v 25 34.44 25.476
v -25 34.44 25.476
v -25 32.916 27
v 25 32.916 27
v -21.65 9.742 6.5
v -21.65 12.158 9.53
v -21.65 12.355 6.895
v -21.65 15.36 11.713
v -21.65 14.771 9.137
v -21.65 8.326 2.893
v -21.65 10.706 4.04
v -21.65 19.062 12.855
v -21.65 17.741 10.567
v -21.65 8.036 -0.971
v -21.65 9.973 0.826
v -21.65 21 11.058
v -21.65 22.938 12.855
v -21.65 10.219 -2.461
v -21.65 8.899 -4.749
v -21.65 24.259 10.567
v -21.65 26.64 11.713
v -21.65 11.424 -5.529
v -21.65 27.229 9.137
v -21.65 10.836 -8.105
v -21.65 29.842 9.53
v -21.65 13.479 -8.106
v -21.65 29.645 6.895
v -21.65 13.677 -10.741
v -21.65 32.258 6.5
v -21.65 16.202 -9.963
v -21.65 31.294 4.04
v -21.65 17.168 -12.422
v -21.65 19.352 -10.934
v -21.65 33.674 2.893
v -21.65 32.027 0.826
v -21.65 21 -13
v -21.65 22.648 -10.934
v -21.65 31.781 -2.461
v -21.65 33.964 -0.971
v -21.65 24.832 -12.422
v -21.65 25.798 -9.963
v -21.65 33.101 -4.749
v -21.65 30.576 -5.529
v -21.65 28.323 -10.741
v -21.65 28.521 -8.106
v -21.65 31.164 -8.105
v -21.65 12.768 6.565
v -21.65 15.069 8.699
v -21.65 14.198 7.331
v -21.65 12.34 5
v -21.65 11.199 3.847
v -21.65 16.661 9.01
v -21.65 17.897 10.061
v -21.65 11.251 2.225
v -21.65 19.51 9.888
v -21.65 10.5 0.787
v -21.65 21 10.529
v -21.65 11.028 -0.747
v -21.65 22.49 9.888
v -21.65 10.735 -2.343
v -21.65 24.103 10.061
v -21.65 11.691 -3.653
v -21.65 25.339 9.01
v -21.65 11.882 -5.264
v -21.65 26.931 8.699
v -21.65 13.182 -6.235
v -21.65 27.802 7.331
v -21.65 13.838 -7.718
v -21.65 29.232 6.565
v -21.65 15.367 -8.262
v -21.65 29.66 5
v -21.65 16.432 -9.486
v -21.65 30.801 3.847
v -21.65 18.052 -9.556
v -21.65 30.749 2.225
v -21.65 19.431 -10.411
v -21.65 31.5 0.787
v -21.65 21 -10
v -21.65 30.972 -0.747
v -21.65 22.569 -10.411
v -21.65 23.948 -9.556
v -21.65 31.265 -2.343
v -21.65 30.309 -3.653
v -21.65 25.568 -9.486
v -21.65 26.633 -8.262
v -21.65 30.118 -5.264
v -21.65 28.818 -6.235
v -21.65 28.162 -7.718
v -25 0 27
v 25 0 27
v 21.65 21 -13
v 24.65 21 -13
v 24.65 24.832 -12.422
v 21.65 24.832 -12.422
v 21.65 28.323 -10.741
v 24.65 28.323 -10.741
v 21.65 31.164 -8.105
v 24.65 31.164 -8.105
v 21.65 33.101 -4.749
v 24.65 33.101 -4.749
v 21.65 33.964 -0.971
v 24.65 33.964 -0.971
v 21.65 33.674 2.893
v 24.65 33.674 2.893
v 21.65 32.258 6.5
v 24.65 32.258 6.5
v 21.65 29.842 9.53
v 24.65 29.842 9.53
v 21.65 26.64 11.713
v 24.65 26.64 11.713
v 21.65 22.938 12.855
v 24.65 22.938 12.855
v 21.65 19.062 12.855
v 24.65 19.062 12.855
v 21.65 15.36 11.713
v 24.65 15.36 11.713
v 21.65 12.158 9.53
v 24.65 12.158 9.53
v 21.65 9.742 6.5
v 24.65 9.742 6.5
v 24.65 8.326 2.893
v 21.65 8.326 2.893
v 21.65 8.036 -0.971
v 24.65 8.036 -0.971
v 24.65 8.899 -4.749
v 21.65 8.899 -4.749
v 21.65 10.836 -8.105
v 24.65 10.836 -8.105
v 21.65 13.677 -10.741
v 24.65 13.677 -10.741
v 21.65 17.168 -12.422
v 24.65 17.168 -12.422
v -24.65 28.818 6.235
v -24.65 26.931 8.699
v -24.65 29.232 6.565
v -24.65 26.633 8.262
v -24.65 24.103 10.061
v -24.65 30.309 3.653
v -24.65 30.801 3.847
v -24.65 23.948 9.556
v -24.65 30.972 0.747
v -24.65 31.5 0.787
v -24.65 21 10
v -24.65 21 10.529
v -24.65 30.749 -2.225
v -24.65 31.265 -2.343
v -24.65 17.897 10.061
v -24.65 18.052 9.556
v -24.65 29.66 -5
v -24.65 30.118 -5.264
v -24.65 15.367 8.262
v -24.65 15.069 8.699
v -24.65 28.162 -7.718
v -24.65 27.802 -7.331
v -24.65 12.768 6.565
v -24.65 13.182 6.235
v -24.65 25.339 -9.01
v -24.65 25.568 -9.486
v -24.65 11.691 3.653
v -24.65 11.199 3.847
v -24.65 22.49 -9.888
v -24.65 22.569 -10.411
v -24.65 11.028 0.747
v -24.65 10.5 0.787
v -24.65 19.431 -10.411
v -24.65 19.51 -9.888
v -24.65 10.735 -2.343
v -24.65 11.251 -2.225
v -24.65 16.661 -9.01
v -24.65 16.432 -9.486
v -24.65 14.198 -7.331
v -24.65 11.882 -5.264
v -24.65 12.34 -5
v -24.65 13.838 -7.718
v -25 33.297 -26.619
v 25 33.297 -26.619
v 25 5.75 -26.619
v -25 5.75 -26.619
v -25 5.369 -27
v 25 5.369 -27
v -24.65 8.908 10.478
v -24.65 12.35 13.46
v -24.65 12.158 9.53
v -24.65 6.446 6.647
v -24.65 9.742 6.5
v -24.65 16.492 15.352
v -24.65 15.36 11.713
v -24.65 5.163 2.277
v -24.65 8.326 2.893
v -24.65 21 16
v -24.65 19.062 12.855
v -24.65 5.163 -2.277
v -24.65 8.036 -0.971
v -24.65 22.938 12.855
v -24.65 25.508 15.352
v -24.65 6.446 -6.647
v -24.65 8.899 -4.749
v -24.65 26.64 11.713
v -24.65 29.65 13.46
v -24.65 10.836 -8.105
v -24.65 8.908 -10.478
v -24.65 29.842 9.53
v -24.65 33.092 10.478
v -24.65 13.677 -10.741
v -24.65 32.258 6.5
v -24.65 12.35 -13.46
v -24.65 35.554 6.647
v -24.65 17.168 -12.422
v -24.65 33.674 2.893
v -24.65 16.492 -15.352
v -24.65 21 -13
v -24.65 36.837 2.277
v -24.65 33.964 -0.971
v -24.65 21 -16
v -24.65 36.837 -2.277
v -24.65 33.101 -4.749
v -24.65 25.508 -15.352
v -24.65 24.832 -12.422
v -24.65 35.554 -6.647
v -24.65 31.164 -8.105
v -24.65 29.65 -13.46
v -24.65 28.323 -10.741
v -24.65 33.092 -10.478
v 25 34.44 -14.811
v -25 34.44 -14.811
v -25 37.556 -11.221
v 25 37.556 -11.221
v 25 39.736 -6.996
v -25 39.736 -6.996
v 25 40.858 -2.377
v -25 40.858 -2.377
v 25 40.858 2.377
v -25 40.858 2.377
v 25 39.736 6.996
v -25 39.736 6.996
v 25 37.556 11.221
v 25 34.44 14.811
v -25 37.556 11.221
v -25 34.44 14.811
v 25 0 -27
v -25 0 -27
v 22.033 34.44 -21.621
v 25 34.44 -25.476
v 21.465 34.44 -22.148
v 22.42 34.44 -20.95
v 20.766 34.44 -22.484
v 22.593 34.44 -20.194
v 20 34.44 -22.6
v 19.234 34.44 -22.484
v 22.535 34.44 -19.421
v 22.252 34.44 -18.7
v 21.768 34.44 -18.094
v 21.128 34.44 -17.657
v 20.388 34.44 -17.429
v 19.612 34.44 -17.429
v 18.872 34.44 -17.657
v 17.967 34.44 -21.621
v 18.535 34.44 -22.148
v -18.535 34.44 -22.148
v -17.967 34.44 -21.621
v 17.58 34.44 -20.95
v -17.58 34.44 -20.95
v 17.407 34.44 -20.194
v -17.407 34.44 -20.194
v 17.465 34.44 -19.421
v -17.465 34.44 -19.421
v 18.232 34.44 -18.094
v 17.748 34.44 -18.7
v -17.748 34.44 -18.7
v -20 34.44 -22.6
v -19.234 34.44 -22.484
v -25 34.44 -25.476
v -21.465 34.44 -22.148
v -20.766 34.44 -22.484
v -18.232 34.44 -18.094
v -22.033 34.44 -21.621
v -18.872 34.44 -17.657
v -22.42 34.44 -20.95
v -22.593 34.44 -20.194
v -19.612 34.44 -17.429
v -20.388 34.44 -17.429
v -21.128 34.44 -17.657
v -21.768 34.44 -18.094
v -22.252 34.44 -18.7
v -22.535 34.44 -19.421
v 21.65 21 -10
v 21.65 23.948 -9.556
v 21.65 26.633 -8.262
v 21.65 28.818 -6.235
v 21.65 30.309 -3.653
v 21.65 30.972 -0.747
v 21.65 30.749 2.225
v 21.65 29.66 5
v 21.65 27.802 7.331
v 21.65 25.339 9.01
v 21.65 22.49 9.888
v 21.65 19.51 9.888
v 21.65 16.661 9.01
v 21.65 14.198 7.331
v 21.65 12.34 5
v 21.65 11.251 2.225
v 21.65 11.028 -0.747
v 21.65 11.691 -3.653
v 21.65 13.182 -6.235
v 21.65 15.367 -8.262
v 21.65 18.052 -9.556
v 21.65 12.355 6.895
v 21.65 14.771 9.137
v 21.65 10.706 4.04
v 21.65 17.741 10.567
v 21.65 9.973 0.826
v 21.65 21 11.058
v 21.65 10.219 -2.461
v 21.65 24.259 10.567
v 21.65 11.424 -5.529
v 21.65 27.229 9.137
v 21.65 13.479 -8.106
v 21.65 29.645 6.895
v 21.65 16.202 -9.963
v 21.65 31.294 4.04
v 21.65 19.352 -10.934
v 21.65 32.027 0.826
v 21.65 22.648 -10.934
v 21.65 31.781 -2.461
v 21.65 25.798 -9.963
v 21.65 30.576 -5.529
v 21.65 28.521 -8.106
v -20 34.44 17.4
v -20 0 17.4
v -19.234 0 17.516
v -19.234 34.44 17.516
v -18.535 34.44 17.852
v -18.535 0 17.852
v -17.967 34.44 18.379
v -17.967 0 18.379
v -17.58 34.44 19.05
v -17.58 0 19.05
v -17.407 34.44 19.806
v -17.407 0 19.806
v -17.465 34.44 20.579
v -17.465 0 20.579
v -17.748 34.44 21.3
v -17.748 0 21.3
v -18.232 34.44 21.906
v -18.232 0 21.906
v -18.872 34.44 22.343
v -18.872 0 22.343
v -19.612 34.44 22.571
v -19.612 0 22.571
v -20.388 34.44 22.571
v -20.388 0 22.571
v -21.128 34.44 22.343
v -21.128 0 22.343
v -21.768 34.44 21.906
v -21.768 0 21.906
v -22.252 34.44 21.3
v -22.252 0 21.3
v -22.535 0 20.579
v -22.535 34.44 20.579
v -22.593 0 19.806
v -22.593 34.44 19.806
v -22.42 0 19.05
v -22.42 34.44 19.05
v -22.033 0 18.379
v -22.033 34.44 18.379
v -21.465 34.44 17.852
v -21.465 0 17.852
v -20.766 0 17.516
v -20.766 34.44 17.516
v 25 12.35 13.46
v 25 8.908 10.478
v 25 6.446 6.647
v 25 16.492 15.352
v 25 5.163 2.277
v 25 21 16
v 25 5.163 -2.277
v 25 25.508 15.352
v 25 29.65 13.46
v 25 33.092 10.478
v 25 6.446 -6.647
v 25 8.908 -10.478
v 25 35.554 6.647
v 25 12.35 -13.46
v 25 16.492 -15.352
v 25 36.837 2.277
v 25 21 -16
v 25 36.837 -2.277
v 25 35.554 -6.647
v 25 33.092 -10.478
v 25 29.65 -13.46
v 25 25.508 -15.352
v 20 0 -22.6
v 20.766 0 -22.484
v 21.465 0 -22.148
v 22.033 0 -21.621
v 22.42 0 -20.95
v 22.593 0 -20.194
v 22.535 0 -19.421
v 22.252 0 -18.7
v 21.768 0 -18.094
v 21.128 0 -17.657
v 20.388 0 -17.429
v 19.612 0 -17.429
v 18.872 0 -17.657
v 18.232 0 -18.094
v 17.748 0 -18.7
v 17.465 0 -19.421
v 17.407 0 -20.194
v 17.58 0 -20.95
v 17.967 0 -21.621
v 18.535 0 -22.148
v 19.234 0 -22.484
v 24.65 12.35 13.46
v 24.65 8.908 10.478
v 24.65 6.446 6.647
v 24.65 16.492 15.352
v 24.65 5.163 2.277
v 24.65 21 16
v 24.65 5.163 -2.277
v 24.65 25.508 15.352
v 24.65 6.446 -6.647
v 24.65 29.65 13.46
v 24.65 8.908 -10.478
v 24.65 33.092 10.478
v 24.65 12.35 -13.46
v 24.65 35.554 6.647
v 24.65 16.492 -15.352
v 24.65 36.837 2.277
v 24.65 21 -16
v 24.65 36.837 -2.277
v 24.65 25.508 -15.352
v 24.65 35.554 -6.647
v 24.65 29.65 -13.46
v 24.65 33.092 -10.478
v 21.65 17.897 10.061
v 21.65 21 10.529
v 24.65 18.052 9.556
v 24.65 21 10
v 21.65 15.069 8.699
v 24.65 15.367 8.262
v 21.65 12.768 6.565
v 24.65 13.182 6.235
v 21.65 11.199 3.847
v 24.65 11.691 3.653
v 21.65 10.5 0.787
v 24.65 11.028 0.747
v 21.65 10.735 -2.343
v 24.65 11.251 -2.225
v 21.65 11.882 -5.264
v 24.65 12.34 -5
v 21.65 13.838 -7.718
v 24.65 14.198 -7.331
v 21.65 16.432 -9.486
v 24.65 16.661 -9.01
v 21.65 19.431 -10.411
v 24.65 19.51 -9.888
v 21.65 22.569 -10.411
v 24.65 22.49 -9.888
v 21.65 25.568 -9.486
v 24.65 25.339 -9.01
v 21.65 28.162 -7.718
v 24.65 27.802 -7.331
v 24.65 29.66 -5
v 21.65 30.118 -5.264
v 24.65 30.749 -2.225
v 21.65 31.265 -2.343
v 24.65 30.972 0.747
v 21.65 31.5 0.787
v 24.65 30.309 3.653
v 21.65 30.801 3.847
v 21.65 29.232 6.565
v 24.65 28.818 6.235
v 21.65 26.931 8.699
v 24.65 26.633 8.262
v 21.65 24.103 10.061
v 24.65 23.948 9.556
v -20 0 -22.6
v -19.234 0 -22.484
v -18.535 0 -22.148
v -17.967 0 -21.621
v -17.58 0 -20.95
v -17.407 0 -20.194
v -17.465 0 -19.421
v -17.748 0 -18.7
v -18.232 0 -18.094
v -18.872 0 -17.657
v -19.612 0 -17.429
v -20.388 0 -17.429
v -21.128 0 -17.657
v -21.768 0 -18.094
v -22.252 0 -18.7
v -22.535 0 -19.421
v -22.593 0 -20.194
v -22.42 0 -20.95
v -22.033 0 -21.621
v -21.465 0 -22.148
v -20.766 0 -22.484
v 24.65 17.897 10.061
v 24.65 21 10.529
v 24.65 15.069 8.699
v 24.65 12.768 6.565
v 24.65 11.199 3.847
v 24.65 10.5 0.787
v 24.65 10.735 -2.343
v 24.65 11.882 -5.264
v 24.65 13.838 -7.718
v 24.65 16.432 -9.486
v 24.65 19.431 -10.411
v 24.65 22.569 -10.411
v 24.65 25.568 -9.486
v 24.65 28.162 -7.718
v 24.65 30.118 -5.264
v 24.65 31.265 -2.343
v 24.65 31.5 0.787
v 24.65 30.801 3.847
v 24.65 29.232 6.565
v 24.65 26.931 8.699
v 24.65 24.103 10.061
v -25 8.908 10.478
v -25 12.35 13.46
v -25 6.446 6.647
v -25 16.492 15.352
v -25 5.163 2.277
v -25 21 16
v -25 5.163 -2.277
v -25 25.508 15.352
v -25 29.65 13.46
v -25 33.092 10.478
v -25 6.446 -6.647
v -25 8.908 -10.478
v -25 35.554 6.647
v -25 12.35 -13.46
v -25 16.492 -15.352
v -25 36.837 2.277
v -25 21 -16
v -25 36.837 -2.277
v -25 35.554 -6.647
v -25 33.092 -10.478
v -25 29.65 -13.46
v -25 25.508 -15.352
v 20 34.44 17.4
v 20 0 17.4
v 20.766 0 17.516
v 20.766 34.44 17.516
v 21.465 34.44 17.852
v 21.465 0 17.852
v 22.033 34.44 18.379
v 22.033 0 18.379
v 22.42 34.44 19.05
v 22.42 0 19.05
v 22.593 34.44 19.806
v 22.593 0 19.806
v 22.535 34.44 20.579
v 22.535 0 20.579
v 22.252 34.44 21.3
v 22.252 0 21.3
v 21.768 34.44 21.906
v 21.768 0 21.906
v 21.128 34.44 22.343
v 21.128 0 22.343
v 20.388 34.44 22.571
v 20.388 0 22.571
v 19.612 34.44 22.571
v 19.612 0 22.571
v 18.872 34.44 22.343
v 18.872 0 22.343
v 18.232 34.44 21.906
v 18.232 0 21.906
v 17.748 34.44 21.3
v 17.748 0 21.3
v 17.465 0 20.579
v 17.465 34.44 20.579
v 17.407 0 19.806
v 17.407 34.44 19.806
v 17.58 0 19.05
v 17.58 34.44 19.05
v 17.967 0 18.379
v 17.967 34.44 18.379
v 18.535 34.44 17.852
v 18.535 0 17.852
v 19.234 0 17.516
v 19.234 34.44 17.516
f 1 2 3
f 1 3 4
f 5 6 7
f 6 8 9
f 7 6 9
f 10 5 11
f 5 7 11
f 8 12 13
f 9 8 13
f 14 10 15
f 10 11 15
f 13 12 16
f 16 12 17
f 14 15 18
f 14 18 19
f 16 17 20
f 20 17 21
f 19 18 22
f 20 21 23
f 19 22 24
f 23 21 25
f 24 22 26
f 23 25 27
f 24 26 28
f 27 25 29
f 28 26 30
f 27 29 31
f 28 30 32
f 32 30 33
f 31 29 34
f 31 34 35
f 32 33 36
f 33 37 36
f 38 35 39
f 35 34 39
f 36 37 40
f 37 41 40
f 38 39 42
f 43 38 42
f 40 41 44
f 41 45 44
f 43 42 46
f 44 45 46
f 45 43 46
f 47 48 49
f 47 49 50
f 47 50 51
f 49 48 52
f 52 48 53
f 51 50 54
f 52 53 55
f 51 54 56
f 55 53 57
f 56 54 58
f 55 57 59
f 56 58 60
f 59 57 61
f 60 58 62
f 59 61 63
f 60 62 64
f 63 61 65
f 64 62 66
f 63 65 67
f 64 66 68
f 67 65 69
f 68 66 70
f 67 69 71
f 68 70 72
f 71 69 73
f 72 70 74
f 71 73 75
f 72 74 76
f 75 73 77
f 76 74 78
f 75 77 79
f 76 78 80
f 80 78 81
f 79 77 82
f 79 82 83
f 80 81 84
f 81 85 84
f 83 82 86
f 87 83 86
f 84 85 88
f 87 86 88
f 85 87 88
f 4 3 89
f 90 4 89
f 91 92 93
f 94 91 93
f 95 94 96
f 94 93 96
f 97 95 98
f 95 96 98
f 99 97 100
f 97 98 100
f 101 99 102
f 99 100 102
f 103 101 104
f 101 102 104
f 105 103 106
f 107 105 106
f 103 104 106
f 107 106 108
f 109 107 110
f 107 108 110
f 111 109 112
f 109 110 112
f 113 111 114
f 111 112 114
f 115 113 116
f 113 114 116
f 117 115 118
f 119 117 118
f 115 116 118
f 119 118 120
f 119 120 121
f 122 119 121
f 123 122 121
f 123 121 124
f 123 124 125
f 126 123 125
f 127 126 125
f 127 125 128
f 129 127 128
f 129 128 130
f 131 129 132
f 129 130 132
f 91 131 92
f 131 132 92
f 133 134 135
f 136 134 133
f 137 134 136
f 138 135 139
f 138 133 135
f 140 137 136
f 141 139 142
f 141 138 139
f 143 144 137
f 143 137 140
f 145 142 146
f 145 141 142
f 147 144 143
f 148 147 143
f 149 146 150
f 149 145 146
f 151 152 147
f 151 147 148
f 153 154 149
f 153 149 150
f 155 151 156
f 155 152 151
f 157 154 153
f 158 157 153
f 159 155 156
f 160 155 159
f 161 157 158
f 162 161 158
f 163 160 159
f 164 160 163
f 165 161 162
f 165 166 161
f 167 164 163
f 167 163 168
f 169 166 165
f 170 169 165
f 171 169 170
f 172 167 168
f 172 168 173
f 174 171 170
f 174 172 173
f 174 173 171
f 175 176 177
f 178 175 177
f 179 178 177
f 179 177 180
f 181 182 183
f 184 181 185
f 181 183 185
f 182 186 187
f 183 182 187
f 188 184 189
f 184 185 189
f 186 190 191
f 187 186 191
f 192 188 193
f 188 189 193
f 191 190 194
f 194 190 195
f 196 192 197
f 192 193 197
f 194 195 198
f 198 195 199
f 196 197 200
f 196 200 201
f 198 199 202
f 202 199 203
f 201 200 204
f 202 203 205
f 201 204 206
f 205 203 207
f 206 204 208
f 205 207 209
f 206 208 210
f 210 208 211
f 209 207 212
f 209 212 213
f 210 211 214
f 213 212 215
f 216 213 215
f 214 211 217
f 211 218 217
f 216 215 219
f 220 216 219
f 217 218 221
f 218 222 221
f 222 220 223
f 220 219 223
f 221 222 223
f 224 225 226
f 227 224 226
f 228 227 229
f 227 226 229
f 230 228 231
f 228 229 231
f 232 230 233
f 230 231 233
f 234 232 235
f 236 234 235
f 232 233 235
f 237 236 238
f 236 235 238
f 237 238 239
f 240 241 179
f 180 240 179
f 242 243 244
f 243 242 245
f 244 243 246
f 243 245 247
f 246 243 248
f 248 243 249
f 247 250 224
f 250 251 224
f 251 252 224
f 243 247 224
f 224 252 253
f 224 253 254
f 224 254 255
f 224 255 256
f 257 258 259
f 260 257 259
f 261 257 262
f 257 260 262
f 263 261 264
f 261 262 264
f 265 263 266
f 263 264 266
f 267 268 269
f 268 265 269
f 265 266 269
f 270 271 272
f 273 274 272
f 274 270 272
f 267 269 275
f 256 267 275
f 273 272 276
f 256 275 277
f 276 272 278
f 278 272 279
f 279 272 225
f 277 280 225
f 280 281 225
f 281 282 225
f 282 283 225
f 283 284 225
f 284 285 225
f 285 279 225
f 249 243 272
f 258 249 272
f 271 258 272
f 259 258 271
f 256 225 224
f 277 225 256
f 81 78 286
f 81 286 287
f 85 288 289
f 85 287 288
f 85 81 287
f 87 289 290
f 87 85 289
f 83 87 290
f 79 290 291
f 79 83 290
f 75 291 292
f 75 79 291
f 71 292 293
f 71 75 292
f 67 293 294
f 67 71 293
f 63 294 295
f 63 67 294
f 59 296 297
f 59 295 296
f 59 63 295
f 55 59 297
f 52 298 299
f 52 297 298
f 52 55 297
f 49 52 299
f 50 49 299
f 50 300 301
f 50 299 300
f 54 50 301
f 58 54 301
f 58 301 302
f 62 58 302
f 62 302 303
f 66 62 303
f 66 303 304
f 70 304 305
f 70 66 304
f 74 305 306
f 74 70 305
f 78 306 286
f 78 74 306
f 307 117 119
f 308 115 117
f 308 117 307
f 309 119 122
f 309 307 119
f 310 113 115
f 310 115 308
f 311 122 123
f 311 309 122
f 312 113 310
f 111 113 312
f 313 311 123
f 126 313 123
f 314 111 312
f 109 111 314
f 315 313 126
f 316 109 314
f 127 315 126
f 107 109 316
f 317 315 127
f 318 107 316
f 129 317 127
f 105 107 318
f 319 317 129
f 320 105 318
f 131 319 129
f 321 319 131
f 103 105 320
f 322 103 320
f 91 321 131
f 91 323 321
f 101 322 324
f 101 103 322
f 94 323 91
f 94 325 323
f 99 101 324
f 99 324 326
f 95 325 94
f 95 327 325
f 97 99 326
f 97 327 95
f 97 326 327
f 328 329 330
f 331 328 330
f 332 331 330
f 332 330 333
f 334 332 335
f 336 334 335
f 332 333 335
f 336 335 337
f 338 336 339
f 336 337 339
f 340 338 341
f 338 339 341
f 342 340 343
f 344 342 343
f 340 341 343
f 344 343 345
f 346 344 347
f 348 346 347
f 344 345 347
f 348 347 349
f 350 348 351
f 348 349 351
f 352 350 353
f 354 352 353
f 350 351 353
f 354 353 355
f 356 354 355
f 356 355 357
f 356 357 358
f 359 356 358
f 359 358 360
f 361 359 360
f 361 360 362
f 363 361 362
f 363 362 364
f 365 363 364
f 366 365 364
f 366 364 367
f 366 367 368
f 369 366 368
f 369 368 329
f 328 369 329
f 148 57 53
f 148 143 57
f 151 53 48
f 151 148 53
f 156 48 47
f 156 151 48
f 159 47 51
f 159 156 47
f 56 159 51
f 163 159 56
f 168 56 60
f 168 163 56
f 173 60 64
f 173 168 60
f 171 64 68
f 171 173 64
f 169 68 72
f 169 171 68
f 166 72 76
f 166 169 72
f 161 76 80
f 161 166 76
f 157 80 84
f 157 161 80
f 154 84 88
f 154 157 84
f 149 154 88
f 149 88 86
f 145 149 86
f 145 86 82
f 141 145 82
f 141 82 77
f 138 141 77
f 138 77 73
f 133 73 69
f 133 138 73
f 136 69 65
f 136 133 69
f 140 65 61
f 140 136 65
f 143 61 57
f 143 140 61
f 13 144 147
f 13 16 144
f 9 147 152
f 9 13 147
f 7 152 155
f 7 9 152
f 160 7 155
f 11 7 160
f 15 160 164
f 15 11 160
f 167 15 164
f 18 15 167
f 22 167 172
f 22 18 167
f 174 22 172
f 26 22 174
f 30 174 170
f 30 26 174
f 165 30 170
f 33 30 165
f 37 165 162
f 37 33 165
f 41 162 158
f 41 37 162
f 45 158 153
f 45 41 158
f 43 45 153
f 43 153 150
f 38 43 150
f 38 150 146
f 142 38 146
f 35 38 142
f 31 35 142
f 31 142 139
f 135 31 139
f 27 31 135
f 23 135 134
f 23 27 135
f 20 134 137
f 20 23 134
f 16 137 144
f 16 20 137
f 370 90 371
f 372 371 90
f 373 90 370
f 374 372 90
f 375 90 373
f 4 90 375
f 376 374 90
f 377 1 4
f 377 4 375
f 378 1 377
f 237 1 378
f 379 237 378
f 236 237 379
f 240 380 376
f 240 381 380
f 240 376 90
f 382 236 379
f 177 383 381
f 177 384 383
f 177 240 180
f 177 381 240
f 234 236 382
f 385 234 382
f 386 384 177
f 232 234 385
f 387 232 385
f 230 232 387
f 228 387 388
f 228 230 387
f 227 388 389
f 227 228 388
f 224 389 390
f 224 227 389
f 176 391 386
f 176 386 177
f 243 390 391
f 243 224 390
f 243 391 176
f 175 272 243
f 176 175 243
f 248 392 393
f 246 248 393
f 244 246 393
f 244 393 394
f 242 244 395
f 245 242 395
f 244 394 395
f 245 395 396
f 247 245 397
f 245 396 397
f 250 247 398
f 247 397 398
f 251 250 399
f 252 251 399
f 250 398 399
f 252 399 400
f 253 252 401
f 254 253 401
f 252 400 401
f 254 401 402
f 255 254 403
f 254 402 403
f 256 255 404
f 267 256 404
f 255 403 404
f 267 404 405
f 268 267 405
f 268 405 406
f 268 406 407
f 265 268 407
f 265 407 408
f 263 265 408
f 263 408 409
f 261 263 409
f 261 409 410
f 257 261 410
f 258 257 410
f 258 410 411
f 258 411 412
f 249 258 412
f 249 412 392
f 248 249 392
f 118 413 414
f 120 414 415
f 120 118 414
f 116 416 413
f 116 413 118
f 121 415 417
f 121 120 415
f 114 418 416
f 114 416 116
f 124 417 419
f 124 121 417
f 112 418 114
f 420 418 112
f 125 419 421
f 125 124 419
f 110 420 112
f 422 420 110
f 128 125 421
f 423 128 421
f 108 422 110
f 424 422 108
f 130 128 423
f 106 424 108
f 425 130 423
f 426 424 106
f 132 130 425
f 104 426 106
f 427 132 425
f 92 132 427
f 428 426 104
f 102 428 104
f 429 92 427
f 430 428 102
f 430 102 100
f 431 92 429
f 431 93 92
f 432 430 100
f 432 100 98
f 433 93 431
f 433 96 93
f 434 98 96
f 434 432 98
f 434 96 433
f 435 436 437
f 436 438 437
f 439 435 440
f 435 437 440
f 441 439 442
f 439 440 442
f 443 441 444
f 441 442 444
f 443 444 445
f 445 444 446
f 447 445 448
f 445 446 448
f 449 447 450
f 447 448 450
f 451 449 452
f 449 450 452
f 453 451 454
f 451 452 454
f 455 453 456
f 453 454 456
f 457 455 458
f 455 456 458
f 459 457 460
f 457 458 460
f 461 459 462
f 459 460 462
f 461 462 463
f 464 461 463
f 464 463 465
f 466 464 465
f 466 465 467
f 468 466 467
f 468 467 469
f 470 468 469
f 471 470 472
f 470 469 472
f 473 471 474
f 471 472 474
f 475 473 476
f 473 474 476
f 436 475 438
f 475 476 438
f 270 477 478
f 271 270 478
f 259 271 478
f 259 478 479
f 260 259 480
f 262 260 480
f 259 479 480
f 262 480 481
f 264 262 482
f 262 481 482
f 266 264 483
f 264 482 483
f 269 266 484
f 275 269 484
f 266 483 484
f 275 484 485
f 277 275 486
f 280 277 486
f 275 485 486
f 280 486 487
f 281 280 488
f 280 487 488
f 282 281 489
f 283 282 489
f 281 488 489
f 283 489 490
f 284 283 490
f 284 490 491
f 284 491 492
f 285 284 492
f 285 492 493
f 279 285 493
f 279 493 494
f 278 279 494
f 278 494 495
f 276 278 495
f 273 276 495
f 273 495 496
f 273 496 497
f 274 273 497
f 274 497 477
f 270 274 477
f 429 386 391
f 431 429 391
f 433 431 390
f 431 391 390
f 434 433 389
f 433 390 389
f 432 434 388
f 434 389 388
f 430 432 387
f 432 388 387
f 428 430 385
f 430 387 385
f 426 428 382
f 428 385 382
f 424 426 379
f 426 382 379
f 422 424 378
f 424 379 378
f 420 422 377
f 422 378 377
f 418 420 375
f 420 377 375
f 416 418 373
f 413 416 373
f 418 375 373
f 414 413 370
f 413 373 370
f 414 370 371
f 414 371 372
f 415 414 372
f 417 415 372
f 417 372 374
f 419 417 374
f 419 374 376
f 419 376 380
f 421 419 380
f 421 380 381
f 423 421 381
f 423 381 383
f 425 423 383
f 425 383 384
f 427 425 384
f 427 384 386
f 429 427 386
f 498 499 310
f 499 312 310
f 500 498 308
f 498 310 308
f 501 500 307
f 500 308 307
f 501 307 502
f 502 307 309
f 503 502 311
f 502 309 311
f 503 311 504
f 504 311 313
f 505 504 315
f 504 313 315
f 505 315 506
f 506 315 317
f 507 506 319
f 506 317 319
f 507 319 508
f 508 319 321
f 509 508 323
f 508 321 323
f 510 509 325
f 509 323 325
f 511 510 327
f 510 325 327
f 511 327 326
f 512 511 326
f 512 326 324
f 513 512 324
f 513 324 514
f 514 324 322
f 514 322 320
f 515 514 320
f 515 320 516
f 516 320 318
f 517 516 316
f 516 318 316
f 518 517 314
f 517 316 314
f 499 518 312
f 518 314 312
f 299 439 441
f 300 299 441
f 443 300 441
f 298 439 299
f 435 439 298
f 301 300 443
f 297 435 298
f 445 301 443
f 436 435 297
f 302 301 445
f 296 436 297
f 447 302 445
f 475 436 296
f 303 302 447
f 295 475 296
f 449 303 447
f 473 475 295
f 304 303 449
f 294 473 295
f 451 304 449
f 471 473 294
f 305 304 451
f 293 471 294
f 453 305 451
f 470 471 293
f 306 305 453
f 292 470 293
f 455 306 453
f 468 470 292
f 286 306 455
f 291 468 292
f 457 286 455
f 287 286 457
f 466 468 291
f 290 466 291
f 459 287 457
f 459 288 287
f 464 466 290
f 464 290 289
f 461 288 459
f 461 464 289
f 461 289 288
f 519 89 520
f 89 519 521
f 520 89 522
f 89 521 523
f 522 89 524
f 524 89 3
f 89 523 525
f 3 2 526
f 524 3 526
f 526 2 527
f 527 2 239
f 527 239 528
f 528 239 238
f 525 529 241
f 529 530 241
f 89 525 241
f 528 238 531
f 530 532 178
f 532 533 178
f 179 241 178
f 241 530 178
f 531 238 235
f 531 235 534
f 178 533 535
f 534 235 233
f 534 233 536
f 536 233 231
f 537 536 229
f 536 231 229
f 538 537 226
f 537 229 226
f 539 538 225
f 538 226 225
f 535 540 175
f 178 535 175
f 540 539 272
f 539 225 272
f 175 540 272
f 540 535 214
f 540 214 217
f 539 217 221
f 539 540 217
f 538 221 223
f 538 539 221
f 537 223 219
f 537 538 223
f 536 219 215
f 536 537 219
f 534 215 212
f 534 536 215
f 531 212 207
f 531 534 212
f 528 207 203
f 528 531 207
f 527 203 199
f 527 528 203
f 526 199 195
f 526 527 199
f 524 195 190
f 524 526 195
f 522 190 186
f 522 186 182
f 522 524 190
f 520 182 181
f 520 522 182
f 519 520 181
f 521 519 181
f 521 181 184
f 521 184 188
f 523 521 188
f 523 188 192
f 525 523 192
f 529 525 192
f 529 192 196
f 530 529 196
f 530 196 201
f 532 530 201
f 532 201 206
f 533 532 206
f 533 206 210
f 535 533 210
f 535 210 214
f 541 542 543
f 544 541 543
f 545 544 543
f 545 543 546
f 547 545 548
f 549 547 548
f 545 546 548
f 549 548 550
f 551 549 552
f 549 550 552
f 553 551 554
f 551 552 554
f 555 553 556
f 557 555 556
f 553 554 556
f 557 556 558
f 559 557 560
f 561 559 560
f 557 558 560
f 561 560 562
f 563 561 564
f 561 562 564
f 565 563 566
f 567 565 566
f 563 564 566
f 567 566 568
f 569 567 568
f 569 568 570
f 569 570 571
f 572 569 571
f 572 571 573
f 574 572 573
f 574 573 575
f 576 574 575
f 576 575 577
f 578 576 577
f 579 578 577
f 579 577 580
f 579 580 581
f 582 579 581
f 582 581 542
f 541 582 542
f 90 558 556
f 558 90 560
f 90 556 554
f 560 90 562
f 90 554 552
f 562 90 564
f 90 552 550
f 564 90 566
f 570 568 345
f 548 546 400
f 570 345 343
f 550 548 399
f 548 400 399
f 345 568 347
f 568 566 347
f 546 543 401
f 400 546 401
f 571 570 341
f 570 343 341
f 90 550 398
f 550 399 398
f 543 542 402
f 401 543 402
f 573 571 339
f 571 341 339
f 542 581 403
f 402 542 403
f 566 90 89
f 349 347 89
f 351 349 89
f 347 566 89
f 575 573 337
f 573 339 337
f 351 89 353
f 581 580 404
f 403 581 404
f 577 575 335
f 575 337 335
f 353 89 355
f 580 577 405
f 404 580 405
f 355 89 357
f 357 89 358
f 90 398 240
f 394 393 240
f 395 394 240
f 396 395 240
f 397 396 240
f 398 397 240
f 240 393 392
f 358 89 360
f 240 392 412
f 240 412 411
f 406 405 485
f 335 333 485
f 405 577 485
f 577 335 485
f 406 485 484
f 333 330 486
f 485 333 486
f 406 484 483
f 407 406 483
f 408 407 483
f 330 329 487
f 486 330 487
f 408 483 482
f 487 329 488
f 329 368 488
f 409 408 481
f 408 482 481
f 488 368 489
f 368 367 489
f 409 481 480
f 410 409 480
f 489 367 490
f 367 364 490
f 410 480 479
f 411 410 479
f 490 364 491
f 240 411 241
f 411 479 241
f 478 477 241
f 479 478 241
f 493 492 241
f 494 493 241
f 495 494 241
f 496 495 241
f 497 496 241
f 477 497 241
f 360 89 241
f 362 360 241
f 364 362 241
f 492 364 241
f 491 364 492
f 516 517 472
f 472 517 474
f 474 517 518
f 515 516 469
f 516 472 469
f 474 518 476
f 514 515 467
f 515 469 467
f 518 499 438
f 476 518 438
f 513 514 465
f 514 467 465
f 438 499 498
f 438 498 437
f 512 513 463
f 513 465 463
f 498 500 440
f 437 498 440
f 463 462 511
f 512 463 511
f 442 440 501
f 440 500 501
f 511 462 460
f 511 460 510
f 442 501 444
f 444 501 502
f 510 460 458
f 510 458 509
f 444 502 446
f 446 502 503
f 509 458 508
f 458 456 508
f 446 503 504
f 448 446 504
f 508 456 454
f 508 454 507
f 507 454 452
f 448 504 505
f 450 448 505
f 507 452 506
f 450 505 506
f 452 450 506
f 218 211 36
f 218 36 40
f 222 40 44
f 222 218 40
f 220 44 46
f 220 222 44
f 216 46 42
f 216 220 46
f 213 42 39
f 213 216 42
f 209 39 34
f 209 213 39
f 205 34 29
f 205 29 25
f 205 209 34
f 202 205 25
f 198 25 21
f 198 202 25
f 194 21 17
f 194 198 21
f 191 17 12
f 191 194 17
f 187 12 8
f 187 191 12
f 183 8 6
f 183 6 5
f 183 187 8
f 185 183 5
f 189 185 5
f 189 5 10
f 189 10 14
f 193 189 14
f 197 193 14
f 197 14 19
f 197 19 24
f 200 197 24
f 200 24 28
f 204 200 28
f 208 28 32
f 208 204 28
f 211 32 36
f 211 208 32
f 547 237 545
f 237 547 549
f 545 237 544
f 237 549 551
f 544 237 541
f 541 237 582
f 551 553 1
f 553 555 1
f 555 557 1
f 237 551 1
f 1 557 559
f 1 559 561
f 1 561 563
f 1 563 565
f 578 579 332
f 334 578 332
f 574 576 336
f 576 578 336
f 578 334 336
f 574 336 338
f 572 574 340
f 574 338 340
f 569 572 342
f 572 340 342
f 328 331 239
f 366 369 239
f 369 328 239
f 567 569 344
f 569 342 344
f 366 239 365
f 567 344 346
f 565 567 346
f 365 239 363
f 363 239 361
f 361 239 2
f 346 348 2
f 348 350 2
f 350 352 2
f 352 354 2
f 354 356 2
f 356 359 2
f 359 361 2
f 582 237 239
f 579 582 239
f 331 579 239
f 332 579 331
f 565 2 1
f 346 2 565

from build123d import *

# Parameters (mm, degrees)
BOSS_EXTRUDE1_DEPTH      = 25
BOSS_EXTRUDE1_DEPTH_BACK = 25
SKETCH3_R                = 10
SKETCH4_R                = 16
CUT_EXTRUDE1_DEPTH       = 3.35
BOSS_EXTRUDE2_START      = 3
SKETCH5_R                = 16
SKETCH5_R_2              = 13
BOSS_EXTRUDE2_DEPTH      = 3
CHAMFER1_SIZE            = 1.523622135
CUT_EXTRUDE2_DEPTH       = 71.071392165
SKETCH11_R               = 2.6
CUT_EXTRUDE6_DEPTH       = 17.22
SKETCH12_R               = 2.6
CUT_EXTRUDE7_DEPTH       = 56.090834083


with BuildPart() as part:
    # Sketch3 → Boss-Extrude1 (new, two sides: drawn at the far end of the back side and taken through both)
    with BuildSketch(Plane(origin=(0, 0, 0), x_dir=(0, 0, -1), z_dir=(1, 0, 0)).offset(-BOSS_EXTRUDE1_DEPTH_BACK)):
        with BuildLine():
            Line((27, 0), (27, 34.44))
            Line((27, 34.44), (14.811022922, 34.44))
            ThreePointArc((14.811022922, 34.44), (0, 41), (-14.811022922, 34.44))
            Line((-14.811022922, 34.44), (-27, 34.44))
            Line((-27, 34.44), (-27, 0))
            Line((-27, 0), (27, 0))
        make_face()
        with Locations((0, 21)):
            Circle(SKETCH3_R, mode=Mode.SUBTRACT)
    extrude(amount=BOSS_EXTRUDE1_DEPTH + BOSS_EXTRUDE1_DEPTH_BACK)

    # Sketch4 → Cut-Extrude1 (cut)
    with BuildSketch(Plane(origin=(25, 0, 0), x_dir=(0, 0, -1), z_dir=(1, 0, 0))):
        with Locations((0, 21)):
            Circle(SKETCH4_R)
    cut_extrude1 = extrude(amount=-CUT_EXTRUDE1_DEPTH, mode=Mode.SUBTRACT)

    # Sketch5 → Boss-Extrude2 (add)
    with BuildSketch(Plane(origin=(21.65, 0, 0), x_dir=(0, 0, -1), z_dir=(1, 0, 0)).offset(BOSS_EXTRUDE2_START)):
        with Locations((0, 21)):
            Circle(SKETCH5_R)
        with Locations((0, 21)):
            Circle(SKETCH5_R_2, mode=Mode.SUBTRACT)
    boss_extrude2 = extrude(amount=-BOSS_EXTRUDE2_DEPTH)

    # Sketch6 → Revolve1 (revolve)
    with BuildSketch(Plane.XY, mode=Mode.PRIVATE) as revolve1_sk:
        Polygon((24.65, 31), (24.65, 31.528980942), (21.65, 32.057961884), (21.65, 31.528980942), align=None)
    revolve1 = revolve(revolve1_sk.sketch.rotate(Axis((-24.65, 21, 0), (1, 0, 0)), 90), axis=Axis((-24.65, 21, 0), (1, 0, 0)))

    # Mirror1: Cut-Extrude1, Boss-Extrude2, Revolve1 across plane
    add(cut_extrude1.mirror(Plane(origin=(0, 0, 0), x_dir=(0, 0, 1), z_dir=(1, 0, 0))), mode=Mode.SUBTRACT)
    add(boss_extrude2.mirror(Plane(origin=(0, 0, 0), x_dir=(0, 0, 1), z_dir=(1, 0, 0))))
    add(revolve1.mirror(Plane(origin=(0, 0, 0), x_dir=(0, 0, 1), z_dir=(1, 0, 0))))

    # Chamfer1
    chamfer1_edges = [part.edges().sort_by_distance(p)[0] for p in [
        (0, 34.44, 27),
        (0, 34.44, -27),
    ]]
    chamfer(chamfer1_edges, length=CHAMFER1_SIZE)

    # Sketch7 → Cut-Extrude2 (cut, through all)
    with BuildSketch(Plane(origin=(25, 0, 0), x_dir=(0, 0, -1), z_dir=(1, 0, 0))):
        Polygon((26.619094466, 5.75), (27, 5.369094466), (27, 32.916377865), (26.619094466, 33.297283399), align=None)
    extrude(amount=-CUT_EXTRUDE2_DEPTH, mode=Mode.SUBTRACT)

    # Sketch11 → Cut-Extrude6 (cut)
    with BuildSketch(Plane.XZ):
        with Locations(Location((-20, 20, 0), (0, 0, 270))):
            Circle(SKETCH11_R)
        with Locations(Location((20, 20, 0), (0, 0, 270))):
            Circle(SKETCH11_R)
        with Locations(Location((20, -20, 0), (0, 0, 270))):
            Circle(SKETCH11_R)
        with Locations(Location((-20, -20, 0), (0, 0, 270))):
            Circle(SKETCH11_R)
    extrude(amount=-CUT_EXTRUDE6_DEPTH, mode=Mode.SUBTRACT)

    # Sketch12 → Cut-Extrude7 (cut, through all)
    with BuildSketch(Plane.XZ):
        with Locations(Location((-20, 20, 0), (0, 0, 270))):
            Circle(SKETCH12_R)
        with Locations(Location((20, 20, 0), (0, 0, 270))):
            Circle(SKETCH12_R)
        with Locations(Location((20, -20, 0), (0, 0, 270))):
            Circle(SKETCH12_R)
        with Locations(Location((-20, -20, 0), (0, 0, 270))):
            Circle(SKETCH12_R)
    extrude(amount=-CUT_EXTRUDE7_DEPTH, mode=Mode.SUBTRACT)


solid = part.part
